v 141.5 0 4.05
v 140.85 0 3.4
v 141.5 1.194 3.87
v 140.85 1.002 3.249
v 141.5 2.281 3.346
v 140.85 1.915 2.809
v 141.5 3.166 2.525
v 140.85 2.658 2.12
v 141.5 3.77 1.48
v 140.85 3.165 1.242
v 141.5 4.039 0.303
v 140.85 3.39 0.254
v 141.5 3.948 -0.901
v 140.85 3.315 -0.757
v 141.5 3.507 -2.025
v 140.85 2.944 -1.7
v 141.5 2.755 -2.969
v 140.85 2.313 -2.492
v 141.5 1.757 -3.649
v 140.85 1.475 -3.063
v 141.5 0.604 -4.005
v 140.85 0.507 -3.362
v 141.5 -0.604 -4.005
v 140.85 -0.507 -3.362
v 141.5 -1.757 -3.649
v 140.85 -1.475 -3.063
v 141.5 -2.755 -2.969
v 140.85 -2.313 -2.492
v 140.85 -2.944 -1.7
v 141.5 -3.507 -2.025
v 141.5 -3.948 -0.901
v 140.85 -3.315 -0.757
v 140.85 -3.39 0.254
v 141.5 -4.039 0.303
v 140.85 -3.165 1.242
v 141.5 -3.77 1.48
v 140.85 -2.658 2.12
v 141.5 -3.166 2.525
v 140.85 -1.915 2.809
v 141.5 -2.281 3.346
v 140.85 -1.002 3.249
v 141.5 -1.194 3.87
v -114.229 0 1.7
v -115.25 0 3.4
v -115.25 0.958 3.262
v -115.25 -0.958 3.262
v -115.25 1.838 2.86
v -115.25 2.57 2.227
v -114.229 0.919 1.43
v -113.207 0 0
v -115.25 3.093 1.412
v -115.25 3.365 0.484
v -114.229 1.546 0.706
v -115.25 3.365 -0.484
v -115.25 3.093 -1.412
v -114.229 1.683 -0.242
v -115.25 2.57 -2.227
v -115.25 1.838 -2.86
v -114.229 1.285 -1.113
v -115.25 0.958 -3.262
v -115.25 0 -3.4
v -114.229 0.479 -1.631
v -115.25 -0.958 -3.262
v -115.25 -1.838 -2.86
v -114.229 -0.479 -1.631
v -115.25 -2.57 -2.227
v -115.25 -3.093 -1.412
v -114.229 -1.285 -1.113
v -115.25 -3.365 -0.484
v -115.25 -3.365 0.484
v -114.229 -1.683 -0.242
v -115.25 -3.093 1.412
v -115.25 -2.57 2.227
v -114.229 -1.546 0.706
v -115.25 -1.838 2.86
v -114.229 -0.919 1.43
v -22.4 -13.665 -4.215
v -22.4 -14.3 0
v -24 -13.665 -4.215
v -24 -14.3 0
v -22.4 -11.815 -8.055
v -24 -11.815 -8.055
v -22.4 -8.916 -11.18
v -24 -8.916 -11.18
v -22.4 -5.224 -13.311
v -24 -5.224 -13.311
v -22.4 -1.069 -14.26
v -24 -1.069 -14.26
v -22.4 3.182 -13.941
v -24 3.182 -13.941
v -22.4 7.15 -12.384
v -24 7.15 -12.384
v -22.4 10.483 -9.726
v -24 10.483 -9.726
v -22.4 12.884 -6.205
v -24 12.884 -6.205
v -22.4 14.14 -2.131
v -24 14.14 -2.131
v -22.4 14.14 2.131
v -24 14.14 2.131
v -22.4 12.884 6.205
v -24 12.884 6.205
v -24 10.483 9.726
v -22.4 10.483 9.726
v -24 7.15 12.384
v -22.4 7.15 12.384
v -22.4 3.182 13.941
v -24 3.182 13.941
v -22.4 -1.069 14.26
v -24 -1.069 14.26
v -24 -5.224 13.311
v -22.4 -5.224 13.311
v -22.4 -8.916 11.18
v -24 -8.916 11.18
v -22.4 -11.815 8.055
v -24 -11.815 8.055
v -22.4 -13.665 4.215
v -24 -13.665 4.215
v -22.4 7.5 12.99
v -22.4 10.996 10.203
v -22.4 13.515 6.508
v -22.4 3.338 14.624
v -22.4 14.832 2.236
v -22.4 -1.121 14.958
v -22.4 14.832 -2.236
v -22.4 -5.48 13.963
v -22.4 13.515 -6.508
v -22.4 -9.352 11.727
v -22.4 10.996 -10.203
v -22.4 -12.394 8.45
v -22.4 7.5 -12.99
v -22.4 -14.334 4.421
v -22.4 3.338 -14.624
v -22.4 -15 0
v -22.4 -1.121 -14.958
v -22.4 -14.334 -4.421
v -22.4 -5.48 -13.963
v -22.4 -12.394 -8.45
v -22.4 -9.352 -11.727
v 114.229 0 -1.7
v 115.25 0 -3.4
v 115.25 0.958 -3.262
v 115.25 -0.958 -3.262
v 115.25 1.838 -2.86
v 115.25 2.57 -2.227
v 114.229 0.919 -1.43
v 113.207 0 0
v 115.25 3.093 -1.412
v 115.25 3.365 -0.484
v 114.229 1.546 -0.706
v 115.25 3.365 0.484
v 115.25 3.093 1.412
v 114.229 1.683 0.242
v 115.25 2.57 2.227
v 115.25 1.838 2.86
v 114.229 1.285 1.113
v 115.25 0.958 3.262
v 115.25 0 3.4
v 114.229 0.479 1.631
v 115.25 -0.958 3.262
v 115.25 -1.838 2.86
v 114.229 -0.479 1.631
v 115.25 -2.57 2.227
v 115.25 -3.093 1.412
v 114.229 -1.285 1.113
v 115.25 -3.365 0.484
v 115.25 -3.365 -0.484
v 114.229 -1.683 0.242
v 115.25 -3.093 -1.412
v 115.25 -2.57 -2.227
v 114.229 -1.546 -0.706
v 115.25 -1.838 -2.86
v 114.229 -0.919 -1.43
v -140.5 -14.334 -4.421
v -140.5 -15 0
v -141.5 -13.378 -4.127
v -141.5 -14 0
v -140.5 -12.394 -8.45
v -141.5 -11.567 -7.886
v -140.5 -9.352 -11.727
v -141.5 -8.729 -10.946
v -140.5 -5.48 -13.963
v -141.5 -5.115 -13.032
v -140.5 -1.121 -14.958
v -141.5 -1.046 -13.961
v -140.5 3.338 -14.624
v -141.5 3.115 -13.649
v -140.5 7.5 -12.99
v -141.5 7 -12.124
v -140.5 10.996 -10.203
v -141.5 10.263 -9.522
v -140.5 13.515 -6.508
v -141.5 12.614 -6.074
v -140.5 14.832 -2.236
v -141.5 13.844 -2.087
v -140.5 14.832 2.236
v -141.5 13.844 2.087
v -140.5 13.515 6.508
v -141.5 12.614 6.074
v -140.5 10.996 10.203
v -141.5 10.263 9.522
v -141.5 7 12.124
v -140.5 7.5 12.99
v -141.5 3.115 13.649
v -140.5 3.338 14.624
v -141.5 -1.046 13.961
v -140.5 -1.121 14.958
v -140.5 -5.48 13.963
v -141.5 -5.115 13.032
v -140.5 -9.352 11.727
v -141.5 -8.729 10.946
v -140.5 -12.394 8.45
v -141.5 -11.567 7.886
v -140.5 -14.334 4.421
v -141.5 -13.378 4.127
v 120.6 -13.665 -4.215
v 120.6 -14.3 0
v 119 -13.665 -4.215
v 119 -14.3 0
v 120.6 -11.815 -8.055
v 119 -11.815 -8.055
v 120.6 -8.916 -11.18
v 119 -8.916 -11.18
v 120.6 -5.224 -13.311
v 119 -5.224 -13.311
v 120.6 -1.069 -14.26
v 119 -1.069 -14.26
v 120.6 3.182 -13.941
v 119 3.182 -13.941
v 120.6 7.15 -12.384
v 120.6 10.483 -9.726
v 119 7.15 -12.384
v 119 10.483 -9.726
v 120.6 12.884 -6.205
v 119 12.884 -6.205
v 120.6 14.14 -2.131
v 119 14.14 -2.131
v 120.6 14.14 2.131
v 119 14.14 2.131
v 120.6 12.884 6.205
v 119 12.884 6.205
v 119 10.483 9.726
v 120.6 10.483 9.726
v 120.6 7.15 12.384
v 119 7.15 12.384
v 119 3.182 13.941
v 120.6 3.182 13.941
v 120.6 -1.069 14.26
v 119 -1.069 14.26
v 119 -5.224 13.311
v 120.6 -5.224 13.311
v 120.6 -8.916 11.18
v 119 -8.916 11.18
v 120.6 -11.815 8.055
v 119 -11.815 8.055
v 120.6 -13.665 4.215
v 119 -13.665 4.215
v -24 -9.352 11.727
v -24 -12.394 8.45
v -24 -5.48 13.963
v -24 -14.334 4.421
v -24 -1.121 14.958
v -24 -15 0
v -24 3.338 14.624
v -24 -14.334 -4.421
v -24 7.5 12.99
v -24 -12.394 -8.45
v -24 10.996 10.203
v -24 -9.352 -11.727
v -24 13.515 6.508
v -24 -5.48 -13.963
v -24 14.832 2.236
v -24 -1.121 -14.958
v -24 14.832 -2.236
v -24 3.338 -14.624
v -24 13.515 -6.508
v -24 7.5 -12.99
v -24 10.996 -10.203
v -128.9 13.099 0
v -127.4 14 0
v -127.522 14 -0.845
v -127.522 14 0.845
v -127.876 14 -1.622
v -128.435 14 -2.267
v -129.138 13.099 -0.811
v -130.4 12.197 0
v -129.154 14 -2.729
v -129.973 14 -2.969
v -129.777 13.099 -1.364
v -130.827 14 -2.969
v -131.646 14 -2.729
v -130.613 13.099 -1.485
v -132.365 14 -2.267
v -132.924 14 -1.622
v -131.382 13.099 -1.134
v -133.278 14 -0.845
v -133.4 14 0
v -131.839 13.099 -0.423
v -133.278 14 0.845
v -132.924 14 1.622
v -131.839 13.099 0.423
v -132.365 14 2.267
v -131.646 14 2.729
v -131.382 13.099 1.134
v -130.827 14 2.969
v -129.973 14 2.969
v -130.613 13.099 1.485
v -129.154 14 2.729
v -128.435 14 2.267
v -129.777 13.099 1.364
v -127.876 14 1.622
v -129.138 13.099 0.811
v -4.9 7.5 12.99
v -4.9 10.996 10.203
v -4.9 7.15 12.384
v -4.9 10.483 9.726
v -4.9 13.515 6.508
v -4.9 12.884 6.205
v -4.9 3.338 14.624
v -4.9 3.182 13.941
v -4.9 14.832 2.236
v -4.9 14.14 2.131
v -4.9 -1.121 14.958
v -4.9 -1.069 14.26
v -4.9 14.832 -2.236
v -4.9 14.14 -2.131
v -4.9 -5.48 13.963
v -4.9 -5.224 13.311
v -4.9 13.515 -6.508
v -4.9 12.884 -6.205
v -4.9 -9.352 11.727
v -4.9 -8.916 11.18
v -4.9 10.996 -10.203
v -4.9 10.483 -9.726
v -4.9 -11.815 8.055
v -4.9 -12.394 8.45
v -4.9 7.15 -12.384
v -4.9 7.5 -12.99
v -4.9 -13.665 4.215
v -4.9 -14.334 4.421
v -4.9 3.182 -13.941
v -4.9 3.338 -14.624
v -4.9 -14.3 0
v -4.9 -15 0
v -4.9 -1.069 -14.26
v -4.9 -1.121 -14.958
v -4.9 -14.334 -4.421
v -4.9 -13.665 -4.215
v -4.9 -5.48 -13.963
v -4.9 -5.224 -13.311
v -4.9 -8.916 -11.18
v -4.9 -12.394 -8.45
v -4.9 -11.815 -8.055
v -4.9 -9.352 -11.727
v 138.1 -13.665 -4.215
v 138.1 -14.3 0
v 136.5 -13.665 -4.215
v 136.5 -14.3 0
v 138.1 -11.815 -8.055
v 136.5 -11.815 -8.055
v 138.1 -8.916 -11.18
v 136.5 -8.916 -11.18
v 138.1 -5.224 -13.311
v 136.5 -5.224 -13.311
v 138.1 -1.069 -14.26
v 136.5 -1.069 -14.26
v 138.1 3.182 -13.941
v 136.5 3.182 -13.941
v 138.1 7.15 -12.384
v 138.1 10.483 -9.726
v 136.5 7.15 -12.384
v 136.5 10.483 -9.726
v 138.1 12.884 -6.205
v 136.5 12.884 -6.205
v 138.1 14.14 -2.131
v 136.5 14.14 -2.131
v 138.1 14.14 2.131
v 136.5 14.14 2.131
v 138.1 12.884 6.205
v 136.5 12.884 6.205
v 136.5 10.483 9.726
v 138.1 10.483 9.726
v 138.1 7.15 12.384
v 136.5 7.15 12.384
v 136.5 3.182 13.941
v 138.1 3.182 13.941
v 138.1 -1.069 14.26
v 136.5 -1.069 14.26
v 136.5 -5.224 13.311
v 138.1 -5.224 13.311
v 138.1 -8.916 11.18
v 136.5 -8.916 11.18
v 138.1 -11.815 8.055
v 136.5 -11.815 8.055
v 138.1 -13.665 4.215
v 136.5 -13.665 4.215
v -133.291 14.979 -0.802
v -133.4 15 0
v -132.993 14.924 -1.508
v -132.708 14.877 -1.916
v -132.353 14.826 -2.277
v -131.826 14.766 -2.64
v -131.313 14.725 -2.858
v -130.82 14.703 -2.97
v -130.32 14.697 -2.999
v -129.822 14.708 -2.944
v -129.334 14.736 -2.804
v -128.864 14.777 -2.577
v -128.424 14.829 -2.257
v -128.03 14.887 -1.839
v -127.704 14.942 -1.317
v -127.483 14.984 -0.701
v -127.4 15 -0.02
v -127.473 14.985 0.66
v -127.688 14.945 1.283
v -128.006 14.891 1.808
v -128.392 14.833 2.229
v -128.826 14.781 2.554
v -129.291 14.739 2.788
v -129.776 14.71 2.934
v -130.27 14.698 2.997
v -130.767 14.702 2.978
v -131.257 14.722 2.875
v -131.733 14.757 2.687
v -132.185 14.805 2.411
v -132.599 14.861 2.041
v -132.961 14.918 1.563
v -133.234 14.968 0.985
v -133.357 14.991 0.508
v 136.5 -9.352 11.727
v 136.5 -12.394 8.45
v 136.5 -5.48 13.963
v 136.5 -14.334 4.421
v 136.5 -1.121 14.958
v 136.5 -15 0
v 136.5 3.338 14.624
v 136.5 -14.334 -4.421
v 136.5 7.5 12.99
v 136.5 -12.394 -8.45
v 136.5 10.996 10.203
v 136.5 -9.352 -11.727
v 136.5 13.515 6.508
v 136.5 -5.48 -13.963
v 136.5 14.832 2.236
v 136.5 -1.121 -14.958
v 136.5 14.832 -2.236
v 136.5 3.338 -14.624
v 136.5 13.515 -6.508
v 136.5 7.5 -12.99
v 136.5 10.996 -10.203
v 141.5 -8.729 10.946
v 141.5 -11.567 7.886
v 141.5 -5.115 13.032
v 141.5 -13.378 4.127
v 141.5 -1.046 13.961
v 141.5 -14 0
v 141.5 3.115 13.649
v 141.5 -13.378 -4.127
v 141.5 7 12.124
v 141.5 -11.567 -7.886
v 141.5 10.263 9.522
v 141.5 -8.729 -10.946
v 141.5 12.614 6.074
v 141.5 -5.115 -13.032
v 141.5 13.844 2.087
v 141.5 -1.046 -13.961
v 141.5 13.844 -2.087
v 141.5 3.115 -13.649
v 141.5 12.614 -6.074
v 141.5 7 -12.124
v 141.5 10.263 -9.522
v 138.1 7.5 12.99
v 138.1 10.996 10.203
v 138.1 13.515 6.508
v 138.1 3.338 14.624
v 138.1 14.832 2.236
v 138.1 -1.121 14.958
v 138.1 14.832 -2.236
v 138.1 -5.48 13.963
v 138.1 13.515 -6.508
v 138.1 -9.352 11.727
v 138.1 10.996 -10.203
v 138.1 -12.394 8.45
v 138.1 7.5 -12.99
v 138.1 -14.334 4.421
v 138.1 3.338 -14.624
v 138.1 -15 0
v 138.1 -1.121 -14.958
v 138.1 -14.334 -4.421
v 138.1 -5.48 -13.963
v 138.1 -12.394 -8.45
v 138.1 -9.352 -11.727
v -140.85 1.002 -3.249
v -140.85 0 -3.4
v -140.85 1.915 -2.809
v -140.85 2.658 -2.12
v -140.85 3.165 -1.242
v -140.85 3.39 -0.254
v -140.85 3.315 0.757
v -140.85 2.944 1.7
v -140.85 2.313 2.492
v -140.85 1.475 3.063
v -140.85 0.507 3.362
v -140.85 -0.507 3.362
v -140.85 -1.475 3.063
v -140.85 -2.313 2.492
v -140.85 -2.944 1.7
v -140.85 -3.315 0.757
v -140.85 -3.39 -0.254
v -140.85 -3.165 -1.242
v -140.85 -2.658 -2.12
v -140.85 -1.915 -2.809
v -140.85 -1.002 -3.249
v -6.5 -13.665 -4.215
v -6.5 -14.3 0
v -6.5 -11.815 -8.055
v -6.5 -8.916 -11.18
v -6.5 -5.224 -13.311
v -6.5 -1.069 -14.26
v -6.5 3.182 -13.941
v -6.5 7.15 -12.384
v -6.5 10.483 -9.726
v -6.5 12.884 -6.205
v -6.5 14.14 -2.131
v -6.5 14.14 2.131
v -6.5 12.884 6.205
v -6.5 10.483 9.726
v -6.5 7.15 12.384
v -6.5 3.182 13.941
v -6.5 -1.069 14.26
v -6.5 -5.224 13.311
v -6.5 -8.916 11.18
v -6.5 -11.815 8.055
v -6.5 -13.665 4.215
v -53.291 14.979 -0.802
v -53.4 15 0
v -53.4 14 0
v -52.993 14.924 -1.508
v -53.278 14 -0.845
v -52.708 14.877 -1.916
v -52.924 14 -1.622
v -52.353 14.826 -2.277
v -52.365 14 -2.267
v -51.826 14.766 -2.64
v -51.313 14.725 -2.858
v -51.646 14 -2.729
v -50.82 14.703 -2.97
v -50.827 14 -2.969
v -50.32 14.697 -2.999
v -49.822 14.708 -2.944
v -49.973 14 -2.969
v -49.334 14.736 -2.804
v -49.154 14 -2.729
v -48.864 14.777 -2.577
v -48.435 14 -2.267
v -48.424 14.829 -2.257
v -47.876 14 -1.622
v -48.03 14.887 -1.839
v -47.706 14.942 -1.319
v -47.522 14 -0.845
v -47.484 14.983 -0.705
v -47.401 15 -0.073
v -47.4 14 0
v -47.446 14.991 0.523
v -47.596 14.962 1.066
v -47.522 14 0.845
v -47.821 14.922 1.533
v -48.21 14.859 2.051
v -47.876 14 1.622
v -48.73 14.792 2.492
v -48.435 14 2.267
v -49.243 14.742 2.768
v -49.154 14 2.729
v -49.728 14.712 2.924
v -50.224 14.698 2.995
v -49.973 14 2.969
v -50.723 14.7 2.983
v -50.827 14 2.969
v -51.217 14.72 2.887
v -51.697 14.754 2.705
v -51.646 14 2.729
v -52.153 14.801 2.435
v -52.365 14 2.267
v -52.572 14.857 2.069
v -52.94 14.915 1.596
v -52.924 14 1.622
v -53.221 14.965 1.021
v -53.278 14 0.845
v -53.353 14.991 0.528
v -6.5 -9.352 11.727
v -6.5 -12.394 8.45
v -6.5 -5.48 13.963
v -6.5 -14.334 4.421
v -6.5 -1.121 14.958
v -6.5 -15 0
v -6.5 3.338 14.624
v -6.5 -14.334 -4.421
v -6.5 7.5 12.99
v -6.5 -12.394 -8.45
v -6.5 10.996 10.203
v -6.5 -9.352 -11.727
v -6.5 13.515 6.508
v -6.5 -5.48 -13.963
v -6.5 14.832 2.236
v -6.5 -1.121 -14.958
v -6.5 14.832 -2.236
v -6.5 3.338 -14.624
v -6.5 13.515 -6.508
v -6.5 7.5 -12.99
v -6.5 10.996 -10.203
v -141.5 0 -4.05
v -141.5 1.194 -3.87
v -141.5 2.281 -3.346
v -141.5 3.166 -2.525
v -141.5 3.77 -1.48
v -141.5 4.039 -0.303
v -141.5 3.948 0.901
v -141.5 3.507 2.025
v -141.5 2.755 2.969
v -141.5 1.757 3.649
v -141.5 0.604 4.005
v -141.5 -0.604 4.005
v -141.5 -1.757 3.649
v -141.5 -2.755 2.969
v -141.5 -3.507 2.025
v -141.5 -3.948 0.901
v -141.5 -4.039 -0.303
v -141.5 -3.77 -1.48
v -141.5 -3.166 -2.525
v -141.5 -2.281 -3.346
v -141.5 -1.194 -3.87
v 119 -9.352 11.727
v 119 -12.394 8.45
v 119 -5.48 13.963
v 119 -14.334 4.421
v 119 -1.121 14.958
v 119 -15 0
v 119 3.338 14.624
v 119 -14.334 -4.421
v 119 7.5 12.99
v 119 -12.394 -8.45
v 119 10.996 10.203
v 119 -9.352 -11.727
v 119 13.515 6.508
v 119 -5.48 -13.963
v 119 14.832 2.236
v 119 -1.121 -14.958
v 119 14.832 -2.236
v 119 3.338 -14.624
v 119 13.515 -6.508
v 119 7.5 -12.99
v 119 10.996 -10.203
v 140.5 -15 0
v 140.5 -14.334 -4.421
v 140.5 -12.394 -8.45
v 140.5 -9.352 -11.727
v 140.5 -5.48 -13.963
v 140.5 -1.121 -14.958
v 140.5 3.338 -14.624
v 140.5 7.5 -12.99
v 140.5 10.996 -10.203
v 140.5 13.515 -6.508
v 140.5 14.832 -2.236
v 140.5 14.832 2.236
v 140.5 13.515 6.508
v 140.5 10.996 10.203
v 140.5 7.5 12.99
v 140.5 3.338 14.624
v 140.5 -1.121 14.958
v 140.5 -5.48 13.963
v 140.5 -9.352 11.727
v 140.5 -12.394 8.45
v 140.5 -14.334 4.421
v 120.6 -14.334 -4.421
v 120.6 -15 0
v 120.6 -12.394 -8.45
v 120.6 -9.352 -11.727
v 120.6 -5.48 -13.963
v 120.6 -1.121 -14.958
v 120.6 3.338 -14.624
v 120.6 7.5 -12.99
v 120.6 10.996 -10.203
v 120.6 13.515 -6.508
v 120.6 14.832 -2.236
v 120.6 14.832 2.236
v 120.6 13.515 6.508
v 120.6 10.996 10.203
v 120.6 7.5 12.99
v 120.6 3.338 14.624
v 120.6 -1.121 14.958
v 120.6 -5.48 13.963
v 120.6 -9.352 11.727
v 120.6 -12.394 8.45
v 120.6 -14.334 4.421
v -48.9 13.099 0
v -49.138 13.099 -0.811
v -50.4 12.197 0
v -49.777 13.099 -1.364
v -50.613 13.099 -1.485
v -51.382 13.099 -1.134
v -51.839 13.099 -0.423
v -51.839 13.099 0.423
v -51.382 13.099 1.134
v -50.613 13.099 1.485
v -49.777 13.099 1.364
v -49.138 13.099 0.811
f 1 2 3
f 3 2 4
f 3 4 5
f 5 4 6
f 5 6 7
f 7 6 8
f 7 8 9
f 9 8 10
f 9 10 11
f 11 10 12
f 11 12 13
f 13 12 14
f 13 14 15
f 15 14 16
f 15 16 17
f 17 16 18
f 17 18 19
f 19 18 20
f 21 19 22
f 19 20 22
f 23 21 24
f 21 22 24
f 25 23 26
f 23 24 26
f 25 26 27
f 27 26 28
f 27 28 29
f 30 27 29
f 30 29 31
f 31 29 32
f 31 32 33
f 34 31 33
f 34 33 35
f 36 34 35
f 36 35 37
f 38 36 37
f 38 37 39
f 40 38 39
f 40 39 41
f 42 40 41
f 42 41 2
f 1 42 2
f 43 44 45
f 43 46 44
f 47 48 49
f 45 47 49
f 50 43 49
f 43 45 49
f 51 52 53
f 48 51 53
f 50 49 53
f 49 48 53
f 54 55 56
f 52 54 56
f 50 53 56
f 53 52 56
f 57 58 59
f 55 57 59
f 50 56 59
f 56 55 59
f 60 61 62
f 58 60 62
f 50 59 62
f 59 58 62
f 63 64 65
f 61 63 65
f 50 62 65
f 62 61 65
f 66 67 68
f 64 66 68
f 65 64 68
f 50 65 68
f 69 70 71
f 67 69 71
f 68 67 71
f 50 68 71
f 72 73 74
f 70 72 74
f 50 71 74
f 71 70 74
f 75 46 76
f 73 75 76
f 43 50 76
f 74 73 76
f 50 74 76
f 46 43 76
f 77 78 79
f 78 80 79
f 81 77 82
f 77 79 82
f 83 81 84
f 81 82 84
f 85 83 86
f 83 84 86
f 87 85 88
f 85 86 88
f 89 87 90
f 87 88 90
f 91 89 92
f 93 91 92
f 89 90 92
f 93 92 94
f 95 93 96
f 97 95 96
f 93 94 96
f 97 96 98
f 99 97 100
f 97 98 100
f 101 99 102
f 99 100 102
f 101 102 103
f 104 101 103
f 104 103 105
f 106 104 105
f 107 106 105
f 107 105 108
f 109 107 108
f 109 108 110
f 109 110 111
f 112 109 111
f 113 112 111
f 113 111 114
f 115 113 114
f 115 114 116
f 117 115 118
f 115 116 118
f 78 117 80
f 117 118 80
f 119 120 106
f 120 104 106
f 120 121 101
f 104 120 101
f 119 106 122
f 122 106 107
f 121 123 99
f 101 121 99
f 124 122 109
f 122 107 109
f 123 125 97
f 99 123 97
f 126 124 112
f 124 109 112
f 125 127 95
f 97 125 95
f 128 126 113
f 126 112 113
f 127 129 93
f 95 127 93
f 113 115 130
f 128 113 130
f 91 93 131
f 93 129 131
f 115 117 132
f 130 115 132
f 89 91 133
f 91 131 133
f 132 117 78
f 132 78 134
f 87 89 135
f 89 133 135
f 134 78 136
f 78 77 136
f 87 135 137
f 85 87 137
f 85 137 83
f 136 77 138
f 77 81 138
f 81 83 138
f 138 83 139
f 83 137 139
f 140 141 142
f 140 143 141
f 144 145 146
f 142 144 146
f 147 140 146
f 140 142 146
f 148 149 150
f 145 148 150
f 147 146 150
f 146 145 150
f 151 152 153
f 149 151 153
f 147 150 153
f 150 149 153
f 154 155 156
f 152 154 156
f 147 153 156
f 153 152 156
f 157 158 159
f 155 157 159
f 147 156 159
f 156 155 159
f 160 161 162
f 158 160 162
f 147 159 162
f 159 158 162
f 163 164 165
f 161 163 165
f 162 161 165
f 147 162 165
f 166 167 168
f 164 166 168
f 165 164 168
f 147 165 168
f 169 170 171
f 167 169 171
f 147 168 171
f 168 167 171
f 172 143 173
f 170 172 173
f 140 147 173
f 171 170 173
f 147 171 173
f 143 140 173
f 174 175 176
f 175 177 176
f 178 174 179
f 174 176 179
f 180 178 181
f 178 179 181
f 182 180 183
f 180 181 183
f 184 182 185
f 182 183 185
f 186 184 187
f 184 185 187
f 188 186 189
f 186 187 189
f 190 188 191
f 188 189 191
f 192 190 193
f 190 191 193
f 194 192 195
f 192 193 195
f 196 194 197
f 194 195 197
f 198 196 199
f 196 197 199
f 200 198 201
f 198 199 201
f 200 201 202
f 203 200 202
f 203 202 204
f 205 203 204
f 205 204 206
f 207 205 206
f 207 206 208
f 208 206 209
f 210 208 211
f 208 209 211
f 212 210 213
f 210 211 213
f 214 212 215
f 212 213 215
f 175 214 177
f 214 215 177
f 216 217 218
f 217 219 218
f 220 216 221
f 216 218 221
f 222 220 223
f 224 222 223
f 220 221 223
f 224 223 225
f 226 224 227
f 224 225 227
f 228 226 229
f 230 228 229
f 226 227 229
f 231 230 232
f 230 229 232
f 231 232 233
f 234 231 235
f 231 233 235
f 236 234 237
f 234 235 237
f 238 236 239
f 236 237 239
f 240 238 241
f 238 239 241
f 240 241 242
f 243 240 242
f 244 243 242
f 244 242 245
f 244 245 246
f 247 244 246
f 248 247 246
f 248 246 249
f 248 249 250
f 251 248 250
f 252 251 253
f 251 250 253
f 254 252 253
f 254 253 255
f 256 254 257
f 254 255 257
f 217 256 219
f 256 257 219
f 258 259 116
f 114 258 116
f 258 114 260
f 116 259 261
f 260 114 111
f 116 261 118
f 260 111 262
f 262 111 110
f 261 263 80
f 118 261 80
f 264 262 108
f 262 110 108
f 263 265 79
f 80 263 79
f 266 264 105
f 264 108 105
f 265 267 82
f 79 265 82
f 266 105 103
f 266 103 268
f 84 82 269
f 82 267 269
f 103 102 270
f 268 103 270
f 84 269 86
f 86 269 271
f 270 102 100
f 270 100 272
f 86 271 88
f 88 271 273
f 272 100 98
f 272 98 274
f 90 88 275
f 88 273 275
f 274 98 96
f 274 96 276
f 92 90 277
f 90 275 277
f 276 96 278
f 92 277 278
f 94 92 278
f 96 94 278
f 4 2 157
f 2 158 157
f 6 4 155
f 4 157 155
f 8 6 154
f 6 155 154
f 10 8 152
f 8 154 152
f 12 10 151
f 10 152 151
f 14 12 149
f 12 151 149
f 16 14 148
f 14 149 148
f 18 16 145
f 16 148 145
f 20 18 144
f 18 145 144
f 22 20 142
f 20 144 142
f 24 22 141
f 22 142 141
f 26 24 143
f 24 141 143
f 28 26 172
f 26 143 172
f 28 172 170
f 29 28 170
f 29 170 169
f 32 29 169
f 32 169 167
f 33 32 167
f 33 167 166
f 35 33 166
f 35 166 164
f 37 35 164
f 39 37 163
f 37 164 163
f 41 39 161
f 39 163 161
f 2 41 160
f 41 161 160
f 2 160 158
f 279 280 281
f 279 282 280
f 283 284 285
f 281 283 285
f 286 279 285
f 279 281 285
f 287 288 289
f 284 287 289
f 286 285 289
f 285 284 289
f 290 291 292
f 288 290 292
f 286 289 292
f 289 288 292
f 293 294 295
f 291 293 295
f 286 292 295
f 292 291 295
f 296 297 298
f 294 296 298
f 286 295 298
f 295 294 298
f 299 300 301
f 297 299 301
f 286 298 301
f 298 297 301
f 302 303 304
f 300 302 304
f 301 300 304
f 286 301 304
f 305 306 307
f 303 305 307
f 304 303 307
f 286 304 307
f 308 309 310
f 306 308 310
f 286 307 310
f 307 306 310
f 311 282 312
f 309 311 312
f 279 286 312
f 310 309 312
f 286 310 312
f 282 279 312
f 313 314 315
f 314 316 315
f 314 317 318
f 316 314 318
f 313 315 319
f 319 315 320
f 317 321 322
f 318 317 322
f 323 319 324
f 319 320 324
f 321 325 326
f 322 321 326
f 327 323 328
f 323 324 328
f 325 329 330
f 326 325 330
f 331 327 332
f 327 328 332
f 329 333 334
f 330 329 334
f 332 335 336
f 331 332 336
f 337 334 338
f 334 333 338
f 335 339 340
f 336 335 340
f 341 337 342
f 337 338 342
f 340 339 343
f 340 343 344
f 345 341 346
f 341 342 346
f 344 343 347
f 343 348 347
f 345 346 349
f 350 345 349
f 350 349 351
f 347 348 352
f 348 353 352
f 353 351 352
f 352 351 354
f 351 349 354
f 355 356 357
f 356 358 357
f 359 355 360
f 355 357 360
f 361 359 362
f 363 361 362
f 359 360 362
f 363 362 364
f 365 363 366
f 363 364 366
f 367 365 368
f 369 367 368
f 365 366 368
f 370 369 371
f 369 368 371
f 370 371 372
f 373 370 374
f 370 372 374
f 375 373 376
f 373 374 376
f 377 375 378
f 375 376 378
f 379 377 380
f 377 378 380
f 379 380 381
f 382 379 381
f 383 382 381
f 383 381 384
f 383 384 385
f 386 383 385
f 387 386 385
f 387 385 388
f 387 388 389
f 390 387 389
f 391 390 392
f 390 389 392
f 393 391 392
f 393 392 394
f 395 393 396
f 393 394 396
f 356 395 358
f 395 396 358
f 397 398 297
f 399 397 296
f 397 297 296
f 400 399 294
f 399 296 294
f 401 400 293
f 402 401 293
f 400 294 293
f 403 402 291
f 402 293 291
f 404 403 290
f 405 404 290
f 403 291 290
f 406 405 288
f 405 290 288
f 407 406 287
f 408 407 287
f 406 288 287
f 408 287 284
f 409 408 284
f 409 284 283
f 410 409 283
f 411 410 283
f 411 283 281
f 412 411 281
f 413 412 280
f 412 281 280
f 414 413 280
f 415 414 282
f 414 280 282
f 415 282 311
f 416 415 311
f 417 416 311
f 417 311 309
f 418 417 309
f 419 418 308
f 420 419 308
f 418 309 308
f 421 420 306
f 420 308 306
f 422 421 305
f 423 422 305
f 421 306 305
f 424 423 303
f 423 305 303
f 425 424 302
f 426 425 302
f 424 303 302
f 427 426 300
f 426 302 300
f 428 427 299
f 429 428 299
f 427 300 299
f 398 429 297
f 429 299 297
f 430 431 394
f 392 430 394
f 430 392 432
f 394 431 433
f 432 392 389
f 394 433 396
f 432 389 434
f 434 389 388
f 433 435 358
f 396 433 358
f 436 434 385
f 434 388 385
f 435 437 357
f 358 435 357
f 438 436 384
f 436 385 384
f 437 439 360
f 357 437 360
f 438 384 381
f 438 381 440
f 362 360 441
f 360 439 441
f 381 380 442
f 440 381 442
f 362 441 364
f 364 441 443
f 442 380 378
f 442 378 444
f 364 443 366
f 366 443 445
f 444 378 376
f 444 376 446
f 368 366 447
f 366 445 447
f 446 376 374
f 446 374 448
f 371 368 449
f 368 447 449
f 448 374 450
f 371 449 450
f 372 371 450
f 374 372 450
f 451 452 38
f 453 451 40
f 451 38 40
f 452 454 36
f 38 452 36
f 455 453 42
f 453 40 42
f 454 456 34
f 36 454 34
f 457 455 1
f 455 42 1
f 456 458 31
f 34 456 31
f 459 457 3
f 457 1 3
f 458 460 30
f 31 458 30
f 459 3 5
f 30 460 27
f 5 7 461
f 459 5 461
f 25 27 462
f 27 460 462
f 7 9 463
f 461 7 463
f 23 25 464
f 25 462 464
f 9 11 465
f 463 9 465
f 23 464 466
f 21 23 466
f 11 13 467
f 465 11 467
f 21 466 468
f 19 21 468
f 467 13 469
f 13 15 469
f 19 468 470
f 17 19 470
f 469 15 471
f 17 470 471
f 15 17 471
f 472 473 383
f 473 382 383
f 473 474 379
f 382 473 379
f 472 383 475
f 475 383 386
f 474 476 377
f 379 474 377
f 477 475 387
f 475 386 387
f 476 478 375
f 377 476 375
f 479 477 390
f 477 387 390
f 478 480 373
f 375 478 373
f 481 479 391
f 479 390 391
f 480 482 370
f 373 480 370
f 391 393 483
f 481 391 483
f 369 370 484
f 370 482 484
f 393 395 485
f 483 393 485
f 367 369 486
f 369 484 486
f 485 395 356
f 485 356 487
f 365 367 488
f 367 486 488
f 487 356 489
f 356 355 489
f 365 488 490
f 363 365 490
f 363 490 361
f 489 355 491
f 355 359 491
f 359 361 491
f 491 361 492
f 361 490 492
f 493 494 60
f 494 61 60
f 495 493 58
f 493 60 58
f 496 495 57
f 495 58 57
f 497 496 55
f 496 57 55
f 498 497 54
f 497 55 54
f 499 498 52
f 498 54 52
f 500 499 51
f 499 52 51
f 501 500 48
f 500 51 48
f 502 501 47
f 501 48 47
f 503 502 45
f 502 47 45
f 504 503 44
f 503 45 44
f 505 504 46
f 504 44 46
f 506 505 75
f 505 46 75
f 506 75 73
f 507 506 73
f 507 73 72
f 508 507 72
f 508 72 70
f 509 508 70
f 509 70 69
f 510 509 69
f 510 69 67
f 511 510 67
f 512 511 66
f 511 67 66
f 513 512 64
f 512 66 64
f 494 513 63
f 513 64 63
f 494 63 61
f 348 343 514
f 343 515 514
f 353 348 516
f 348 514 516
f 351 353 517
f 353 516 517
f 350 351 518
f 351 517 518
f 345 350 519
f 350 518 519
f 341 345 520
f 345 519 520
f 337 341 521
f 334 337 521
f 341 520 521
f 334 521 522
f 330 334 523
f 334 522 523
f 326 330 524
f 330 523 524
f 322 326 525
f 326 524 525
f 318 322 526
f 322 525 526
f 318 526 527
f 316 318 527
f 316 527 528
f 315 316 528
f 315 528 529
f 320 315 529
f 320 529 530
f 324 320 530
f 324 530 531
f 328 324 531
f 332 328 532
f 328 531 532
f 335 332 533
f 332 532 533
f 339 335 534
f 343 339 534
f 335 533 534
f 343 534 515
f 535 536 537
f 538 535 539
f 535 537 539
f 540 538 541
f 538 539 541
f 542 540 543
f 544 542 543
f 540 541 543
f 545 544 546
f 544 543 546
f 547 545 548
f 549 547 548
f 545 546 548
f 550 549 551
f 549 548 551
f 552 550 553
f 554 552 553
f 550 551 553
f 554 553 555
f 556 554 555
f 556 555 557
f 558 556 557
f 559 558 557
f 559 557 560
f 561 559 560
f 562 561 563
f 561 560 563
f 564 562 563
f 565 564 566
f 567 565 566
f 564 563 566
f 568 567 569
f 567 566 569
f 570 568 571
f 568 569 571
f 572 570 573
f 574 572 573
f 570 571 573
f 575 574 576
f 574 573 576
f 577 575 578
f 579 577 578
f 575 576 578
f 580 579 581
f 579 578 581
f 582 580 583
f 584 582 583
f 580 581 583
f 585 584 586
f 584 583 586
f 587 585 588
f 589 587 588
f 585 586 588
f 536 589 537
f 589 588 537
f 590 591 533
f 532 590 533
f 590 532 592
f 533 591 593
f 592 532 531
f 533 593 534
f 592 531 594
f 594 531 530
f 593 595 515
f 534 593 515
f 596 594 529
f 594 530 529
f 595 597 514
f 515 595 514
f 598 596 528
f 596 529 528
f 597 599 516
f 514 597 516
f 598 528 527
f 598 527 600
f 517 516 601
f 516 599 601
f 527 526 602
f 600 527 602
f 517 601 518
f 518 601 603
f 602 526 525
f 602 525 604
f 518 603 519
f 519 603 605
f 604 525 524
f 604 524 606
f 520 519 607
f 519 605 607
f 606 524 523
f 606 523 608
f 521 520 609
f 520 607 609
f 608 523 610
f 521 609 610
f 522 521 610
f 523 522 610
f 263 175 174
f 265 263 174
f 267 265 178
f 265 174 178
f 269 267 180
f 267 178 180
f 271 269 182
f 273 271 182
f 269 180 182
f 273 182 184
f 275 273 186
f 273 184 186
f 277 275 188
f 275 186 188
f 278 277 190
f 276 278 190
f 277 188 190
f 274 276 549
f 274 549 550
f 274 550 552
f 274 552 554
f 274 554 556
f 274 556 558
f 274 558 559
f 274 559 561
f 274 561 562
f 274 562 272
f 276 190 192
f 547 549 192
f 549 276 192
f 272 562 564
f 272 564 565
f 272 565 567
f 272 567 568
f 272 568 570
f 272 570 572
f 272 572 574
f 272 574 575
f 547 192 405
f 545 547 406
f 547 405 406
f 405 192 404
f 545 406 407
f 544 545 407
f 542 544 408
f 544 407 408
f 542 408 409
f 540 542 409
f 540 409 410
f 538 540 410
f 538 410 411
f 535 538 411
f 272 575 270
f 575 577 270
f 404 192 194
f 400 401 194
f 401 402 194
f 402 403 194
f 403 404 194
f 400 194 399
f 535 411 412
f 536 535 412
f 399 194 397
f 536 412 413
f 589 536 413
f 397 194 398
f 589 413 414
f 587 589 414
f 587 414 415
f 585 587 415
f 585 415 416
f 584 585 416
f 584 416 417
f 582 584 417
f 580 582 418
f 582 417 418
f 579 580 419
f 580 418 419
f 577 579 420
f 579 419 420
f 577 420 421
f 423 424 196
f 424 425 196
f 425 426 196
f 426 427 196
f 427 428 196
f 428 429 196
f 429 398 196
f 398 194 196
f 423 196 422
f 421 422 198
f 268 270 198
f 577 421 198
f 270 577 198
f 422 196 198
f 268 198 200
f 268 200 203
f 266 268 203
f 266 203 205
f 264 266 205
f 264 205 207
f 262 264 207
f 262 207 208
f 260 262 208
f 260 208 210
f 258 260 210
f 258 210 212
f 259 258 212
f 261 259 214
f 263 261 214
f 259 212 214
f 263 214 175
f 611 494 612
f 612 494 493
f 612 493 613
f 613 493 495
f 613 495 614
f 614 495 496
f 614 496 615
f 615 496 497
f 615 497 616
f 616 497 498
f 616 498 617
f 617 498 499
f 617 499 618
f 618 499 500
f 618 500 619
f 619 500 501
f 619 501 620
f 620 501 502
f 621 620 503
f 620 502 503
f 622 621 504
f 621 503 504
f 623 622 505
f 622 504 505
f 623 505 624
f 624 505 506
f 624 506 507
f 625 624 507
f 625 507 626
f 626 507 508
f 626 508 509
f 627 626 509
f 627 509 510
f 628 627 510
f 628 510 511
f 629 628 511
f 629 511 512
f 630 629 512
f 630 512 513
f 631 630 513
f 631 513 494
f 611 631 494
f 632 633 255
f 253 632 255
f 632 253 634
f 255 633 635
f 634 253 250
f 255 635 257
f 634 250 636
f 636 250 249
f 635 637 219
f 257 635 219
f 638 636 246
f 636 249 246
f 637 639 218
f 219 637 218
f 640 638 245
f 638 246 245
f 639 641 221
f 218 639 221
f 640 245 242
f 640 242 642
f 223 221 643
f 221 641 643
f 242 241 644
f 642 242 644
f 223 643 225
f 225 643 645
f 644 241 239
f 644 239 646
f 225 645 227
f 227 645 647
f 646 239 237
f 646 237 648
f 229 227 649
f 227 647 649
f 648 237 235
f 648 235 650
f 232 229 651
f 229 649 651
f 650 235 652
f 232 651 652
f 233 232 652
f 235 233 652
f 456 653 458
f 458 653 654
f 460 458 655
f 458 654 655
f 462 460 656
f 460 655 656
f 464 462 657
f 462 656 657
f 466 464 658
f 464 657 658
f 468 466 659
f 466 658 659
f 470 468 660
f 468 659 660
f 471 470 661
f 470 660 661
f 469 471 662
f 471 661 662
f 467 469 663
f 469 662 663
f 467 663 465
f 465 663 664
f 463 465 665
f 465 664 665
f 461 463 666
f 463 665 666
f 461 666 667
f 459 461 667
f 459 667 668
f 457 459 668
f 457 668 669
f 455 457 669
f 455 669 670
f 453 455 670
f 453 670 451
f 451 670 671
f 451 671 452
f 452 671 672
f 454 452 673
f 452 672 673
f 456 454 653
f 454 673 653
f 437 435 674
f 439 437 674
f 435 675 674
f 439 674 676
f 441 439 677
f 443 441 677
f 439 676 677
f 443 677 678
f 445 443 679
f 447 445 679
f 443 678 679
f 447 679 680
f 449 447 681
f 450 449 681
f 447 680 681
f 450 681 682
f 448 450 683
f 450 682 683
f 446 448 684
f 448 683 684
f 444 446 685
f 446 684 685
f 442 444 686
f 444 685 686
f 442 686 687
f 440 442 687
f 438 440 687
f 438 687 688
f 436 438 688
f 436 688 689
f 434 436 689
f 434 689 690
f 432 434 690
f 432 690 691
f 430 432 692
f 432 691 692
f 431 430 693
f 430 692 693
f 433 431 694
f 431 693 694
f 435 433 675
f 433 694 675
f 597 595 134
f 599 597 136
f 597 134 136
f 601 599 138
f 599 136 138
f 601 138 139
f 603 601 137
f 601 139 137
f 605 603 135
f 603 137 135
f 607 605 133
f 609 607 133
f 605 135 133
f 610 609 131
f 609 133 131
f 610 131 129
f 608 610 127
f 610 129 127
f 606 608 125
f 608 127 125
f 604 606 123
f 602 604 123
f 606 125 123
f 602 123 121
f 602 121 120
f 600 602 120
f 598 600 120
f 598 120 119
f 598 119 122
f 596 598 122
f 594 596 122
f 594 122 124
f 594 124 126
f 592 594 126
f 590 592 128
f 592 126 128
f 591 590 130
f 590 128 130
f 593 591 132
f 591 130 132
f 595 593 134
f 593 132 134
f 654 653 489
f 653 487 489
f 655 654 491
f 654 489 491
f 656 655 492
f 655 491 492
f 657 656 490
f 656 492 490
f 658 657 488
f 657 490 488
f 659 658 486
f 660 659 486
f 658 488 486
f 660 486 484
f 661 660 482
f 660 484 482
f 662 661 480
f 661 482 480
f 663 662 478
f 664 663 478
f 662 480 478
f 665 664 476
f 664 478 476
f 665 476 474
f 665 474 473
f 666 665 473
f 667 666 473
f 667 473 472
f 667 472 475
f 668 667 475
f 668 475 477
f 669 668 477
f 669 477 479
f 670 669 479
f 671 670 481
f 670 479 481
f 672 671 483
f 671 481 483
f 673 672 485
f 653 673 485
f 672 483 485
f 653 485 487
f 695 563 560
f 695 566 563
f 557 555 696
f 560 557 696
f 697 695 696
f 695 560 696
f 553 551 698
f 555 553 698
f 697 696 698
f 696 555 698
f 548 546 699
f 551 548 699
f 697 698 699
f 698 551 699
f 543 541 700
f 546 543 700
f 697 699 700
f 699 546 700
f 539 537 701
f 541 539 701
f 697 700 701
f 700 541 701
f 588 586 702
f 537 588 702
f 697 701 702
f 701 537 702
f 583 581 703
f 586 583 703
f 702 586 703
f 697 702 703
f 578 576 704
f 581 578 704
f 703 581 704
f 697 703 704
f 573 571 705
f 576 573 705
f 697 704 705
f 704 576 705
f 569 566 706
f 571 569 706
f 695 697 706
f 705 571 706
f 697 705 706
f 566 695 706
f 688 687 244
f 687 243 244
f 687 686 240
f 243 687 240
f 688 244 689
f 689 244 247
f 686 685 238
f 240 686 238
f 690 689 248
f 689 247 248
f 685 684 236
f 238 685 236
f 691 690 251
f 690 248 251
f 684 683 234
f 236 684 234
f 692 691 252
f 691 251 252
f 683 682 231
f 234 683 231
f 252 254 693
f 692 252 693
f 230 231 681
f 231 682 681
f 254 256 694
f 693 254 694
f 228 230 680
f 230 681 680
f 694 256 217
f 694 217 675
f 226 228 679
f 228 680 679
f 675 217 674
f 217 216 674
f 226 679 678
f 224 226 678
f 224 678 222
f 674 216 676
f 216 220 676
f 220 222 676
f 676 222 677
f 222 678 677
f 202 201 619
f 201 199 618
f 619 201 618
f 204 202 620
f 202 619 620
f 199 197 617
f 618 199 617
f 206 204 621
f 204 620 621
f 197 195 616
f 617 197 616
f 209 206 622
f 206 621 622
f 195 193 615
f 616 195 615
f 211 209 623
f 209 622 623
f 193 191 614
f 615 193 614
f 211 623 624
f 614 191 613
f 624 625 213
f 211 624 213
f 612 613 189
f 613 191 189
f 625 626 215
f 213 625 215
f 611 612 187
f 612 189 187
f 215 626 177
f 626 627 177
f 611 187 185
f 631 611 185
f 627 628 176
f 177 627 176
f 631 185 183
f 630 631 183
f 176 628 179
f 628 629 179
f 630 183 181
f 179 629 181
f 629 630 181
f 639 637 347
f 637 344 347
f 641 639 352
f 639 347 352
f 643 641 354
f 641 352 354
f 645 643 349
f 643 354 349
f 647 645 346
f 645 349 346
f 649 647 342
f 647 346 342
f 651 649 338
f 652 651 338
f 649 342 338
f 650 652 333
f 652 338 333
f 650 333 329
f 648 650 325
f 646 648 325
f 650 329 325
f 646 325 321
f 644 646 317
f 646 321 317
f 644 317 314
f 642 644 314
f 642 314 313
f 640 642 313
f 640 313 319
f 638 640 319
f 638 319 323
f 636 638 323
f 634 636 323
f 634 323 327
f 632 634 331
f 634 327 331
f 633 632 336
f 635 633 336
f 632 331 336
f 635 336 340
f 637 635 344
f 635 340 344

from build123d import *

# Parameters (mm, degrees)
M8_GEWINDEBOHRUNG1_D               = 6.8
M8_GEWINDEBOHRUNG1_DEPTH           = 26.25
M8_GEWINDEBOHRUNG1_CSINK_D         = 8.1
M8_GEWINDEBOHRUNG1_CSINK_ANGLE     = 90
M8_GEWINDEBOHRUNG1_TIP             = 2.042926105
M8_GEWINDEBOHRUNG2_D               = 6.8
M8_GEWINDEBOHRUNG2_DEPTH           = 26.25
M8_GEWINDEBOHRUNG2_CSINK_D         = 8.1
M8_GEWINDEBOHRUNG2_CSINK_ANGLE     = 90
M8_GEWINDEBOHRUNG2_TIP             = 2.042926105
F_6_0_6_DURCHMESSER_BOHRUNG1_D     = 6
F_6_0_6_DURCHMESSER_BOHRUNG1_DEPTH = 1
F_6_0_6_DURCHMESSER_BOHRUNG1_TIP   = 1.802581857


with BuildPart() as part:
    # Skizze1 → Basis-Rotation (revolve)
    with BuildSketch(Plane.XY):
        Polygon((-141.5, 14), (-141.5, 0), (141.5, 0), (141.5, 14), (140.5, 15), (138.1, 15), (138.1, 14.3), (136.5, 14.3), (136.5, 15), (120.6, 15), (120.6, 14.3), (119, 14.3), (119, 15), (-4.9, 15), (-4.9, 14.3), (-6.5, 14.3), (-6.5, 15), (-22.4, 15), (-22.4, 14.3), (-24, 14.3), (-24, 15), (-140.5, 15), align=None)
    revolve(axis=Axis((-241.855208518, 0, 0), (1, 0, 0)))

    # M8 Gewindebohrung1
    with Locations(Plane.ZY.offset(141.5)):
        with Locations((0, 0)):
            CounterSinkHole(M8_GEWINDEBOHRUNG1_D / 2, M8_GEWINDEBOHRUNG1_CSINK_D / 2, depth=M8_GEWINDEBOHRUNG1_DEPTH, counter_sink_angle=M8_GEWINDEBOHRUNG1_CSINK_ANGLE)
            with Locations((0, 0, -(M8_GEWINDEBOHRUNG1_DEPTH + M8_GEWINDEBOHRUNG1_TIP / 2))):  # 118° drill point
                Cone(0, M8_GEWINDEBOHRUNG1_D / 2, M8_GEWINDEBOHRUNG1_TIP, mode=Mode.SUBTRACT)

    # M8 Gewindebohrung2
    with Locations(Plane(origin=(141.5, 0, 0), x_dir=(0, 0, -1), z_dir=(1, 0, 0))):
        with Locations((0, 0)):
            CounterSinkHole(M8_GEWINDEBOHRUNG2_D / 2, M8_GEWINDEBOHRUNG2_CSINK_D / 2, depth=M8_GEWINDEBOHRUNG2_DEPTH, counter_sink_angle=M8_GEWINDEBOHRUNG2_CSINK_ANGLE)
            with Locations((0, 0, -(M8_GEWINDEBOHRUNG2_DEPTH + M8_GEWINDEBOHRUNG2_TIP / 2))):  # 118° drill point
                Cone(0, M8_GEWINDEBOHRUNG2_D / 2, M8_GEWINDEBOHRUNG2_TIP, mode=Mode.SUBTRACT)

    # Ø6.0 (6) Durchmesser Bohrung1
    with Locations(Plane(origin=(0, 15, 0), x_dir=(1, 0, 0), z_dir=(0, 1, 0))):
        with Locations((-50.4, 0), (-130.4, 0)):
            Hole(F_6_0_6_DURCHMESSER_BOHRUNG1_D / 2, depth=F_6_0_6_DURCHMESSER_BOHRUNG1_DEPTH)
            with Locations((0, 0, -(F_6_0_6_DURCHMESSER_BOHRUNG1_DEPTH + F_6_0_6_DURCHMESSER_BOHRUNG1_TIP / 2))):  # 118° drill point
                Cone(0, F_6_0_6_DURCHMESSER_BOHRUNG1_D / 2, F_6_0_6_DURCHMESSER_BOHRUNG1_TIP, mode=Mode.SUBTRACT)


solid = part.part
